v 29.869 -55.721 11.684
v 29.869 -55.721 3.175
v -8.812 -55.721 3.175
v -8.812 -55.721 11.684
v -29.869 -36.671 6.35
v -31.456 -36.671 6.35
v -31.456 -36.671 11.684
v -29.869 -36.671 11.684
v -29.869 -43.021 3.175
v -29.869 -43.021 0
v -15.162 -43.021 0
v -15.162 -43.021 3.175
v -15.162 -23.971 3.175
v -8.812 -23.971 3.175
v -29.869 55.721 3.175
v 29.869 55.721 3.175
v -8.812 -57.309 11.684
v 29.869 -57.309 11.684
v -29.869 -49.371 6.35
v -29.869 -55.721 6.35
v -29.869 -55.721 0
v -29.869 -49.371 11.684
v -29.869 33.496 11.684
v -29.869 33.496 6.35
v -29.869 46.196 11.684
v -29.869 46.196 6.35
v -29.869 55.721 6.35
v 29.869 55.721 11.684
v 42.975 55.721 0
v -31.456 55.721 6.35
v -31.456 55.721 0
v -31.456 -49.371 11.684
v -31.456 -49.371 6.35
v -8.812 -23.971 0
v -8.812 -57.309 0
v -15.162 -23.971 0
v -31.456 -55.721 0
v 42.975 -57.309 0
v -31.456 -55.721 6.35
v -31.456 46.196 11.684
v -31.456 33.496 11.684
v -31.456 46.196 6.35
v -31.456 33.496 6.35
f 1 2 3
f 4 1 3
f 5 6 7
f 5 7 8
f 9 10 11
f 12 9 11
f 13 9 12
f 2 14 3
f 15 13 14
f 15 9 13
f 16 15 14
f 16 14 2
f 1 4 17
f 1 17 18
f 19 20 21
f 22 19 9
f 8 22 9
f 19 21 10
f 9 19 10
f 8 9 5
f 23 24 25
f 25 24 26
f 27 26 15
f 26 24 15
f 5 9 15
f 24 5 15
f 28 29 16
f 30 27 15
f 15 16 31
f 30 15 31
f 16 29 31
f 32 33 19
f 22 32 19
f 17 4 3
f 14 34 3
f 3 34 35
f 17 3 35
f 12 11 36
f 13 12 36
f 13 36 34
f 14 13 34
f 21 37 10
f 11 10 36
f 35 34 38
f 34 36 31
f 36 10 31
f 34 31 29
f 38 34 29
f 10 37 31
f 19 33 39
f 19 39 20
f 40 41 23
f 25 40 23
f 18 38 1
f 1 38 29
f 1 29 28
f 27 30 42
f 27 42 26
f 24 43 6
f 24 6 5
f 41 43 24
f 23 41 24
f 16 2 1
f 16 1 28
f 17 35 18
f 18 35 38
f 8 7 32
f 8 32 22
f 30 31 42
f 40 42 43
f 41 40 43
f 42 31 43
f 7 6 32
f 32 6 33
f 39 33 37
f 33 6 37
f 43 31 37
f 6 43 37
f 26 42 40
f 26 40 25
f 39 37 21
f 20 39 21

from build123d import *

# Parameters (mm, degrees)
F1_DEPTH = 3.175
F2_DEPTH = 6.35
F0_W     = 13.1055872
F0_H     = 111.4425
F3_DEPTH = 11.684
F5_DEPTH = 113.03
F6_W     = 1.5875
F6_H     = 12.7
F7_DEPTH = 5.334


with BuildPart() as f1:
    # F0 (on Top) → F1 (new body)
    with BuildSketch(Plane.XY):
        Polygon((29.8689268, -55.72125), (29.8689268, 55.72125), (-29.8689268, 55.72125), (-29.8689268, -43.02125), (-15.1623268, -43.02125), (-15.1623268, -23.97125), (-8.8123268, -23.97125), (-8.8123268, -43.02125), (-8.8123268, -55.72125), align=None)
    extrude(amount=F1_DEPTH)

    # F0 (on Top) → F2 (join)
    with BuildSketch(Plane.XY):
        Polygon((-29.8689268, -43.02125), (-29.8689268, 55.72125), (-31.4564268, 55.72125), (-31.4564268, -55.72125), (-29.8689268, -55.72125), align=None)
    extrude(amount=F2_DEPTH)

    # F0 (on Top) → F3 (join)
    with BuildSketch(Plane.XY):
        Polygon((42.974514, -55.72125), (29.8689268, -55.72125), (-8.8123268, -55.72125), (-8.8123268, -57.30875), (42.974514, -57.30875), align=None)
        with Locations((36.4217204, 0)):
            Rectangle(F0_W, F0_H)
    extrude(amount=F3_DEPTH)

    # F4 (on face) → F5 (cut, through all)
    with BuildSketch(Plane(origin=(0, 55.72125, 0), x_dir=(-1, 0, 0), z_dir=(0, 1, 0))):
        Polygon((-42.974514, 0), (-29.8689268, 11.684), (-42.974514, 11.684), align=None)
    extrude(amount=-F5_DEPTH, mode=Mode.SUBTRACT)

    # F6 (on face) → F7 (join, through all)
    with BuildSketch(Plane.XY.offset(6.35)):
        with Locations((-30.6626768, 39.84625)):
            Rectangle(F6_W, F6_H)
        with Locations((-30.6626768, -43.02125)):
            Rectangle(F6_W, F6_H)
    extrude(amount=F7_DEPTH)


solid = f1.part
